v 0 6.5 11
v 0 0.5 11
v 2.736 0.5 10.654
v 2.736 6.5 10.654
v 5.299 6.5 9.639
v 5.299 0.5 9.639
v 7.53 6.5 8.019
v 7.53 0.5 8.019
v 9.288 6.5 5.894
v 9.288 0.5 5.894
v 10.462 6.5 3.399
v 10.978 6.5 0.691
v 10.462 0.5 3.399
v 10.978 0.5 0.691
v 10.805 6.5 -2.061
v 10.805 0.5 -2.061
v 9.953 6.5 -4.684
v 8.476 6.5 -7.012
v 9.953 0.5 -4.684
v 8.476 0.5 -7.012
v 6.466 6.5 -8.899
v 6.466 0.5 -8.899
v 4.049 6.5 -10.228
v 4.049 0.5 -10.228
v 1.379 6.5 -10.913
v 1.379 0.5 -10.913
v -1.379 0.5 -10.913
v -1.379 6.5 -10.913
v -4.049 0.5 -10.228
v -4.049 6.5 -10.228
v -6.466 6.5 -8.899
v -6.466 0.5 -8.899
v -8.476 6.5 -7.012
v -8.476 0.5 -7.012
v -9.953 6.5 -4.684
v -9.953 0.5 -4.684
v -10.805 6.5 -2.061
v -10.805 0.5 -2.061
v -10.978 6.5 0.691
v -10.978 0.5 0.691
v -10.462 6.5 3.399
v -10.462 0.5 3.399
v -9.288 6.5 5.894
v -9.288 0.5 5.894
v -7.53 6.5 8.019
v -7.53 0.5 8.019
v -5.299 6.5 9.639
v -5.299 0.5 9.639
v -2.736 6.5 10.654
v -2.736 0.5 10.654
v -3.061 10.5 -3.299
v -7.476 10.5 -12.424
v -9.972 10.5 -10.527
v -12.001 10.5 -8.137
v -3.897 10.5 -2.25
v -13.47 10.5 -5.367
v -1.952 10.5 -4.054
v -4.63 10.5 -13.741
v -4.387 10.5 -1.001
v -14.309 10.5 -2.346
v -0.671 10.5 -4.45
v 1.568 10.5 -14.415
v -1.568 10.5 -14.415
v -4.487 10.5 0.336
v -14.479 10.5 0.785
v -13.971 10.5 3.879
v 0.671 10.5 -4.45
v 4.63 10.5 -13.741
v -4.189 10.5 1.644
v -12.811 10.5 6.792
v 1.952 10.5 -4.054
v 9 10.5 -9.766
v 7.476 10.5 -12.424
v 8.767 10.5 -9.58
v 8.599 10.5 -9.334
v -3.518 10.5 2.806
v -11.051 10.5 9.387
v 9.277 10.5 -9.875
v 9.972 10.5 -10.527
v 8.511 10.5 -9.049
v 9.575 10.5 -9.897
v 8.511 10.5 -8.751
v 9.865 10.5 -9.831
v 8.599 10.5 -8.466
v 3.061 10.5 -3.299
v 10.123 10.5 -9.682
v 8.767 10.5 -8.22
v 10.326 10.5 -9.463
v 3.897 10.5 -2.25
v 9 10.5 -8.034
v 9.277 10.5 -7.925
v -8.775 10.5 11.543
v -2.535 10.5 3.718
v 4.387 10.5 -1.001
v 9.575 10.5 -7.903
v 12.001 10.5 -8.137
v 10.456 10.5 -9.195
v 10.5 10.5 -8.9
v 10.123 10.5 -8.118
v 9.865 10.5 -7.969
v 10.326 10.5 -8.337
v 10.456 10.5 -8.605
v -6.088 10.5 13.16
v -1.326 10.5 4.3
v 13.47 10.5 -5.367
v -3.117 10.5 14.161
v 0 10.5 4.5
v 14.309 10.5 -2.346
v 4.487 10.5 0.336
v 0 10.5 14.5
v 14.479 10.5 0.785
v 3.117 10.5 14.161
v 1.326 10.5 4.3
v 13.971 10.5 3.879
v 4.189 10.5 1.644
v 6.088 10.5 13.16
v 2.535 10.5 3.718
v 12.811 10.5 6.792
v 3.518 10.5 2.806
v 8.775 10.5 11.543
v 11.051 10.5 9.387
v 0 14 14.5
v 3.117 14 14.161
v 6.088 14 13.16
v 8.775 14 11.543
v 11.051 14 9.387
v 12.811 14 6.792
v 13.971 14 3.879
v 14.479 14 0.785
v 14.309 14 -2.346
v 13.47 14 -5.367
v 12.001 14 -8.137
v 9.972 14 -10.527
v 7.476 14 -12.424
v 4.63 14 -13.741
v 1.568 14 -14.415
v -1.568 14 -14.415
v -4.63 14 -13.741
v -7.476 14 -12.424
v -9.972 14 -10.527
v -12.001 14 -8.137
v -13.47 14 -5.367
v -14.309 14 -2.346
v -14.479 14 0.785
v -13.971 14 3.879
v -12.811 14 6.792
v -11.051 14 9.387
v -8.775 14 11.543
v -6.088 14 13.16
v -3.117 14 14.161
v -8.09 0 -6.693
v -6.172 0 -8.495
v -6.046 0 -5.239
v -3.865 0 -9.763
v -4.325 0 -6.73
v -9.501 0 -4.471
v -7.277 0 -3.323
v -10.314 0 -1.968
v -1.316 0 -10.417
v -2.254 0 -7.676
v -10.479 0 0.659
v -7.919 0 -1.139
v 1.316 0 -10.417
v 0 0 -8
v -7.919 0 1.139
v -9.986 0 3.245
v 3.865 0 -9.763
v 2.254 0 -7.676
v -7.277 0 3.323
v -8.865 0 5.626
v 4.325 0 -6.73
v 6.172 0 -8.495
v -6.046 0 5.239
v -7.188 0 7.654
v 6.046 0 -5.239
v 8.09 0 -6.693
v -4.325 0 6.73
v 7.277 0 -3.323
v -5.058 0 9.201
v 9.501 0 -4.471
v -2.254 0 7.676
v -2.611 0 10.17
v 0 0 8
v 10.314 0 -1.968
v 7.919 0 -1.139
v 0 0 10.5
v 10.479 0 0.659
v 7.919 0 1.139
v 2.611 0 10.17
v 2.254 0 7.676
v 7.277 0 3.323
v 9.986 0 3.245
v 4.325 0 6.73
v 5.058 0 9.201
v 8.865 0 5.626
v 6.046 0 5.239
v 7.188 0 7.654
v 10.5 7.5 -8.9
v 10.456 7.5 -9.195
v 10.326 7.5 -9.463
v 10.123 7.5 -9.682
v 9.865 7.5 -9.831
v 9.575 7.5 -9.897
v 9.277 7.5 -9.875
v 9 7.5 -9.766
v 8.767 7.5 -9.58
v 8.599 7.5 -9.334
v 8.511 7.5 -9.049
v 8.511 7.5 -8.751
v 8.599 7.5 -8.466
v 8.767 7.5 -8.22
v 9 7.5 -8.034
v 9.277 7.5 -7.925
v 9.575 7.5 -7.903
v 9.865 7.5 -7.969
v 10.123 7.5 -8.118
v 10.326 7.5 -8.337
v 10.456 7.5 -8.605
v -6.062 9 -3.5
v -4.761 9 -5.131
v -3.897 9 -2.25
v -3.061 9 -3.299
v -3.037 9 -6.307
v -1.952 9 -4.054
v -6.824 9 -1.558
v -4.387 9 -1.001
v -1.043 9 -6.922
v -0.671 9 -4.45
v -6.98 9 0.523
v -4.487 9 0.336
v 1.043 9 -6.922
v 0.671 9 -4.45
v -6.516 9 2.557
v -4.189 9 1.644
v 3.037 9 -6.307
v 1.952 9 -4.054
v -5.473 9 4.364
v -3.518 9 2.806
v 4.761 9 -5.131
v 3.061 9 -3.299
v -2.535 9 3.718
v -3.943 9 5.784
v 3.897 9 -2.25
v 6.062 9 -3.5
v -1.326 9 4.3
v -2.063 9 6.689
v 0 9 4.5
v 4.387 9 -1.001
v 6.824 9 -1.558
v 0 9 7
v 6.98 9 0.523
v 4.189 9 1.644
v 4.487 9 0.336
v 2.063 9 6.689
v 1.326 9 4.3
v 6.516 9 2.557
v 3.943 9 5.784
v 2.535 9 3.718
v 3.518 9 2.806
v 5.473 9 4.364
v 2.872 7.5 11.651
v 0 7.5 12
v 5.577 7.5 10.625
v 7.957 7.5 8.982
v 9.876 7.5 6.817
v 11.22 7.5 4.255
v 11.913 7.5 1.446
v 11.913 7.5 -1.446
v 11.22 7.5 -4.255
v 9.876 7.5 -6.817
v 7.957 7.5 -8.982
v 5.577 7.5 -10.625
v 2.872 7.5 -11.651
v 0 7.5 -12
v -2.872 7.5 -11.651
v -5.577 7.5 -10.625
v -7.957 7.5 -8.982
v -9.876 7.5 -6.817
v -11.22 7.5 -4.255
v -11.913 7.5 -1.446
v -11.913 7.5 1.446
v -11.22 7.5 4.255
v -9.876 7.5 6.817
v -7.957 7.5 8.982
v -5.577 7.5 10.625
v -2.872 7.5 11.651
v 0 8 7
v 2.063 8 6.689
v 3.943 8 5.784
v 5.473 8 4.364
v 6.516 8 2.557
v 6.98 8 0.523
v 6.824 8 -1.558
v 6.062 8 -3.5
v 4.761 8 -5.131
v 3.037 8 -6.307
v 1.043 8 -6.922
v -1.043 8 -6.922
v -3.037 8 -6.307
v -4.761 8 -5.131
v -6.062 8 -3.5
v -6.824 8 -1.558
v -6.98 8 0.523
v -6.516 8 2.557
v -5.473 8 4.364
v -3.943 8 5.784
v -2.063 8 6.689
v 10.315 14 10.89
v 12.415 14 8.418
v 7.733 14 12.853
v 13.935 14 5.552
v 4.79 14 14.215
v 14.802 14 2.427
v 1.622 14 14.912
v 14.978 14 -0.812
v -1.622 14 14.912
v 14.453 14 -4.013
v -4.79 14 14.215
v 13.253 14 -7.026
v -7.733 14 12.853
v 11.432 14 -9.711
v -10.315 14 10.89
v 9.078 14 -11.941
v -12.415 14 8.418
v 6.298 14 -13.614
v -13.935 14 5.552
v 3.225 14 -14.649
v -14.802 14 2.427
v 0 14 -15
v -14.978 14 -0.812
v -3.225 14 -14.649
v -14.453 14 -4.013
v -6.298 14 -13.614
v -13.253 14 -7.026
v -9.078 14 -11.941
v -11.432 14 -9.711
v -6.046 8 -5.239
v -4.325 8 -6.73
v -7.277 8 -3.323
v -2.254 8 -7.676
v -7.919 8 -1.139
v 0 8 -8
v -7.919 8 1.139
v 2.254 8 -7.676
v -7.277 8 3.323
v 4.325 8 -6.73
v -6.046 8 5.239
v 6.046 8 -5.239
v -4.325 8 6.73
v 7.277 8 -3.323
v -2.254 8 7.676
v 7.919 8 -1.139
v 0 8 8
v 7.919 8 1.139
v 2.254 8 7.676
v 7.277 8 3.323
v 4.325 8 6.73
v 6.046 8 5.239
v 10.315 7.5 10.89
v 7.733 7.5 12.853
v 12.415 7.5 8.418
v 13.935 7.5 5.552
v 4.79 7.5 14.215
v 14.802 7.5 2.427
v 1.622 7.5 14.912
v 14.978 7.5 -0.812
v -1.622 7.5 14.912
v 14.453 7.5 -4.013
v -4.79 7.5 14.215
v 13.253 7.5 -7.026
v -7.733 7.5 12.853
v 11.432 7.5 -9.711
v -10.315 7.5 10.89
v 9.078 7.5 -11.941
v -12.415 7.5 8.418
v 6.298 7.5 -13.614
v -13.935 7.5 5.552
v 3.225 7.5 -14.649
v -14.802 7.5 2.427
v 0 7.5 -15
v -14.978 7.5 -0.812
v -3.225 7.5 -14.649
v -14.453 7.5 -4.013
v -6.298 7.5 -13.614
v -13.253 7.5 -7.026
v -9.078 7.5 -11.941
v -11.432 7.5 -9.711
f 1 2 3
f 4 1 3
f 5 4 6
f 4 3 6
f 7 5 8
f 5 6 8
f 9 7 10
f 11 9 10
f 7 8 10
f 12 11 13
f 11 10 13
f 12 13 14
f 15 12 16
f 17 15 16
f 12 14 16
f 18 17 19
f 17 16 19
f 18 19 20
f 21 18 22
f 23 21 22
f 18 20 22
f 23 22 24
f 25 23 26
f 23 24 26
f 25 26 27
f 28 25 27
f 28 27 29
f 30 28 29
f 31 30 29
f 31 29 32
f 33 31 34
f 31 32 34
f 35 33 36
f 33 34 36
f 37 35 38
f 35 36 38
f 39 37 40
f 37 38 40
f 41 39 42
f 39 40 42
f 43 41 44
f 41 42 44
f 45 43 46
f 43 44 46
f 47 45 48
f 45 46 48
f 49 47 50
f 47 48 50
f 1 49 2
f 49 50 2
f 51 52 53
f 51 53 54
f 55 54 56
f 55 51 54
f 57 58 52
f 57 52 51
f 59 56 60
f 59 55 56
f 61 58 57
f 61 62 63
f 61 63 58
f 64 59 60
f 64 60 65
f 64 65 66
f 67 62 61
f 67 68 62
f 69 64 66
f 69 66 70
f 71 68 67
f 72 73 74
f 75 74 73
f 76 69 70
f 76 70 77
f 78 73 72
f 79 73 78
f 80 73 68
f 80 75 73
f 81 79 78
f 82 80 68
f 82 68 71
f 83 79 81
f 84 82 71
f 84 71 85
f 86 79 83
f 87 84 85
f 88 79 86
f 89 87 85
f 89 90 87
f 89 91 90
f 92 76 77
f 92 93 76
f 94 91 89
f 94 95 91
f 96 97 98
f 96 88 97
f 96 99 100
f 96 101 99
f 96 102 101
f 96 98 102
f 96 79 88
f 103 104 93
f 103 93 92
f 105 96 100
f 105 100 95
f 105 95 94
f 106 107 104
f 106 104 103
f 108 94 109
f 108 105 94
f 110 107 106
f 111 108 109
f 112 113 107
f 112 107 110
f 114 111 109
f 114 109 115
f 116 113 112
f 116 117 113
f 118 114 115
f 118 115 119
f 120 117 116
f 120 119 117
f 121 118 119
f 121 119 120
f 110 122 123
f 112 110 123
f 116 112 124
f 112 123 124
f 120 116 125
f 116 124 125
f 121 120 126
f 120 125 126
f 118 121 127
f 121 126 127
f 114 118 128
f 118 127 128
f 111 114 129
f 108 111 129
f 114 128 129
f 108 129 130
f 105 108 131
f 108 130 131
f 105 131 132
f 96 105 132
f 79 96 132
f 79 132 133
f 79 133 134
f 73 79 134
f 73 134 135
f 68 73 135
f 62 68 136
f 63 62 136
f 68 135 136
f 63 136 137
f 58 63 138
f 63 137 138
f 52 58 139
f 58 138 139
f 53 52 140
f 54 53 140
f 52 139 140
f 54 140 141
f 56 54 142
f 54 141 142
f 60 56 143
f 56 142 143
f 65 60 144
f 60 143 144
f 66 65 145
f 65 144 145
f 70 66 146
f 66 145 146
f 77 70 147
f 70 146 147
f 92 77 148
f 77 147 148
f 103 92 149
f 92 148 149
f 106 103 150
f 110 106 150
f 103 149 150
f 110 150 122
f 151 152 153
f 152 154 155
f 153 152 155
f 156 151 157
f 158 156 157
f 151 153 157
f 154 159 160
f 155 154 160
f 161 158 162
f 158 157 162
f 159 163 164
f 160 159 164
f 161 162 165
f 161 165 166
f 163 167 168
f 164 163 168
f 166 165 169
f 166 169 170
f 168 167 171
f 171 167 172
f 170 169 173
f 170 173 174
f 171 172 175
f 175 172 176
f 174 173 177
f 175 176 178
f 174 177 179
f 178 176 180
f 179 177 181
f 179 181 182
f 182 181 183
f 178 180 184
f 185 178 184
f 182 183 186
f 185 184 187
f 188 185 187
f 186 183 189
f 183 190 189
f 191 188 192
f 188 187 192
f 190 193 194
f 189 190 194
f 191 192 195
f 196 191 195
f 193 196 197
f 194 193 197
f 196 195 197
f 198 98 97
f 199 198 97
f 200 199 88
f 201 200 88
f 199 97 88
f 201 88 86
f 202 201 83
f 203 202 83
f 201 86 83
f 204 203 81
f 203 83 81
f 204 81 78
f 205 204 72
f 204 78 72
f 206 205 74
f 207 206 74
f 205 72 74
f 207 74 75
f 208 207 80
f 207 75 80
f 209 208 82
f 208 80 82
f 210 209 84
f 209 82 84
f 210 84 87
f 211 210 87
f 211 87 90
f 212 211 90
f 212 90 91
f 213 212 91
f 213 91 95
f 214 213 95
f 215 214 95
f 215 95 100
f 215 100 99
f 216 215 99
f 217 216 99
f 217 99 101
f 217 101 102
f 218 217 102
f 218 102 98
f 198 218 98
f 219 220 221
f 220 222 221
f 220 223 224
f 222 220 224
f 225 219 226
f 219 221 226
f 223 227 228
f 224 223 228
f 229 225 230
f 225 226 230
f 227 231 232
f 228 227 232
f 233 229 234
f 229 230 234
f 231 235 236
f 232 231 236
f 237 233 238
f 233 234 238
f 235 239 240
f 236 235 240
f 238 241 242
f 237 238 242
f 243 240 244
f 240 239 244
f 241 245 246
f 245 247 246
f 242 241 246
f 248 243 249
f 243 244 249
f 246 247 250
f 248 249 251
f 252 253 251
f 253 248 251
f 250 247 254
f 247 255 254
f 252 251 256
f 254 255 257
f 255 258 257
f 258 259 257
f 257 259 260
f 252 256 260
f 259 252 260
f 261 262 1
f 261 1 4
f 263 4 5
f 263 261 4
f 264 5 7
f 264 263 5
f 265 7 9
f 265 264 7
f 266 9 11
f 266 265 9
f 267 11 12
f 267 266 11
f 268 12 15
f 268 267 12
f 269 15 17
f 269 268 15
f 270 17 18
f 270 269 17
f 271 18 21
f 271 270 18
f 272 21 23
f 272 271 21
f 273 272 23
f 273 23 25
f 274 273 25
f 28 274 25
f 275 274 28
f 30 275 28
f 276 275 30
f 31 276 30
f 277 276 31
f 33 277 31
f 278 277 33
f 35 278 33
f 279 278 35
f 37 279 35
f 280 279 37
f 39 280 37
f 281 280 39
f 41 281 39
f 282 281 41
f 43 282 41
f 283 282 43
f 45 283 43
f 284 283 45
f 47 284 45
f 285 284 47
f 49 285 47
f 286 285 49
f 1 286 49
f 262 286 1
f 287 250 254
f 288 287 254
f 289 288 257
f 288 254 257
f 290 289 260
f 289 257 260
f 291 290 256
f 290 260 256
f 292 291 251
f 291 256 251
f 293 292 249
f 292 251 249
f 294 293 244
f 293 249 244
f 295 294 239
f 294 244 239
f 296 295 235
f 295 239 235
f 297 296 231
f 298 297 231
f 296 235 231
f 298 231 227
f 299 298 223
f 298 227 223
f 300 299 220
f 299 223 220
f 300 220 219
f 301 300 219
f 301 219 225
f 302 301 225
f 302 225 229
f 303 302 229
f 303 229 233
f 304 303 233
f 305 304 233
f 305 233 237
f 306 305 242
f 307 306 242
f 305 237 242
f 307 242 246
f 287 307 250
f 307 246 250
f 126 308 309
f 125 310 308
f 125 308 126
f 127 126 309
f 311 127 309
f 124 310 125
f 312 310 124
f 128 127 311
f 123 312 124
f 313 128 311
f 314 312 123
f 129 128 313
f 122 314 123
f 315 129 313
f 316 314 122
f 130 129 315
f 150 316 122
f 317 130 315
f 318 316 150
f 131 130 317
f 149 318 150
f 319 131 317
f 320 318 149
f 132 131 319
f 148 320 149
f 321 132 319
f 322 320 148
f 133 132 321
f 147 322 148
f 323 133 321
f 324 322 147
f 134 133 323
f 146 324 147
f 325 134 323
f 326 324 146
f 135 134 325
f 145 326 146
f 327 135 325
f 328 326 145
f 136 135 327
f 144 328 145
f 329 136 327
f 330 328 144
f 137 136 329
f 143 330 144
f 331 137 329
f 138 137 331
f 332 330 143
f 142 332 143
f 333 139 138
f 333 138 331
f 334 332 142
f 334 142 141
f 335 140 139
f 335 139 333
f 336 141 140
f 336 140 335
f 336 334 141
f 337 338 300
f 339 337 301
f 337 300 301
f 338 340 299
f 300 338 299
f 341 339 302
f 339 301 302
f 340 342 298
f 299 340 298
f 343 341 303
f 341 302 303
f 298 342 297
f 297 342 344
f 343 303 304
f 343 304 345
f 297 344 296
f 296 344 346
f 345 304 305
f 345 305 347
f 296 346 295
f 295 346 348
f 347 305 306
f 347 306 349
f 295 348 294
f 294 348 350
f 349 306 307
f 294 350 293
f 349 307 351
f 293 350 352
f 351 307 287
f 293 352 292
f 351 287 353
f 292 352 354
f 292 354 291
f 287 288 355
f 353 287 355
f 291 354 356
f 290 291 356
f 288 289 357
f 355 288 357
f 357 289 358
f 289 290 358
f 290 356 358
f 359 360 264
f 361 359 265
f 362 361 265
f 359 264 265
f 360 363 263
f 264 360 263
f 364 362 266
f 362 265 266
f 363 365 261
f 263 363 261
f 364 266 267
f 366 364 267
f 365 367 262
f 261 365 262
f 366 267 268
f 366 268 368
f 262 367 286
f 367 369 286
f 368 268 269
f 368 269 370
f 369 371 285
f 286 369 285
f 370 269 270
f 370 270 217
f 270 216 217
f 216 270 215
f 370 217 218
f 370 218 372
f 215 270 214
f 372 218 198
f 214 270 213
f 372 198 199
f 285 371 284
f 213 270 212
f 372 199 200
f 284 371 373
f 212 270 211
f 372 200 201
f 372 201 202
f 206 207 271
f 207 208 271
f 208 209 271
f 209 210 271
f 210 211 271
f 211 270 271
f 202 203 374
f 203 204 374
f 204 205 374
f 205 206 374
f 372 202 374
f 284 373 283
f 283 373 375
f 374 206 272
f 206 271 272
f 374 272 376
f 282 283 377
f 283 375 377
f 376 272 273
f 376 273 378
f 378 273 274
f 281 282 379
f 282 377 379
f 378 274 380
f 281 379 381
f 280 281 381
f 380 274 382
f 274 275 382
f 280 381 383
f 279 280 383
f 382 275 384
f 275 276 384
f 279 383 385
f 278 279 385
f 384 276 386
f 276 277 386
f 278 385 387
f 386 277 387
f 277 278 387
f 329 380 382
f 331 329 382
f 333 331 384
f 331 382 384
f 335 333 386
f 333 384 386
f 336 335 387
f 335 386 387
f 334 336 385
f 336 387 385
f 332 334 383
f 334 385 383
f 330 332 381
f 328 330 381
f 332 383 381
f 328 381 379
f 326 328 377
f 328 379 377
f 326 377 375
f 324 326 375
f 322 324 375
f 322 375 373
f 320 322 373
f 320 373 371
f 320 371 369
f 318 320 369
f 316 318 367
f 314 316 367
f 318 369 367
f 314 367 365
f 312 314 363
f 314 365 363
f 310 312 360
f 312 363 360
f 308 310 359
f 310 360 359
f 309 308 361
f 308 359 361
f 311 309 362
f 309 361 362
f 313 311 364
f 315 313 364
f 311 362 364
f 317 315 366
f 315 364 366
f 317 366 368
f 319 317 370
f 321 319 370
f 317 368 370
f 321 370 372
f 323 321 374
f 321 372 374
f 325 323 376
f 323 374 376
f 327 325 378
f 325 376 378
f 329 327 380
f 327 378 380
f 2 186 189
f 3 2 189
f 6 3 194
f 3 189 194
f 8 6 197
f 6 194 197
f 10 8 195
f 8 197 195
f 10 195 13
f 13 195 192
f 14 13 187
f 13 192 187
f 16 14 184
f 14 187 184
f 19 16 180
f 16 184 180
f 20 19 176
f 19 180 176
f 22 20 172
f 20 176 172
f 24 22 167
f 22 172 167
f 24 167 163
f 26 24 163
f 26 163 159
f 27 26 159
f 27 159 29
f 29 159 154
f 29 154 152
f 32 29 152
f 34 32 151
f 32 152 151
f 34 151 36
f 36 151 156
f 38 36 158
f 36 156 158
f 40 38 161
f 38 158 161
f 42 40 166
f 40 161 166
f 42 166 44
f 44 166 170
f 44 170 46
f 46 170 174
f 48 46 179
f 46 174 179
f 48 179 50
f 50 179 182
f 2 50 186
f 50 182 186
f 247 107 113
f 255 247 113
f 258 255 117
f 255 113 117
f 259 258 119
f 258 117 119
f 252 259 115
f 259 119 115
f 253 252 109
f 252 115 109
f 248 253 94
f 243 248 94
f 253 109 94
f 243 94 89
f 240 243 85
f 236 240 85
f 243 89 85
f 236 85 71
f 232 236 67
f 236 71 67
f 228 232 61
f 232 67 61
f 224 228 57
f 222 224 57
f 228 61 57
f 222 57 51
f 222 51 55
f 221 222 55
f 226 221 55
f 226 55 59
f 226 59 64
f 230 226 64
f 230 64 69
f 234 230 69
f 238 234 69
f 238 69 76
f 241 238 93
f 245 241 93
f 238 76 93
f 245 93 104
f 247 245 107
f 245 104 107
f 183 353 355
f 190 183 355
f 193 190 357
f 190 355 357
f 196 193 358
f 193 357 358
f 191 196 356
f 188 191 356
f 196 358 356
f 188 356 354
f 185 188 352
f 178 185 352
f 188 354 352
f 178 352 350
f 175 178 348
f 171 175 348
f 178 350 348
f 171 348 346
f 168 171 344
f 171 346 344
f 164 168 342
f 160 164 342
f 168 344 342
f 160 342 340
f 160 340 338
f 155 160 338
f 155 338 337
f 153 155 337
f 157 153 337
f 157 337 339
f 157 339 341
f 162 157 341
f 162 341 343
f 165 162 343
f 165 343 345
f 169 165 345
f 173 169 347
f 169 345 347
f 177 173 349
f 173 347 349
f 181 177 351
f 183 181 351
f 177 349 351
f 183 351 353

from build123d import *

# Parameters (mm, degrees)
ESQUISSE1_R              = 11
BOSS_EXTRU_1_DEPTH       = 7.5
ESQUISSE3_R              = 15
BOSS_EXTRU_2_DEPTH       = 6.5
CHANFREIN1_SIZE          = 0.5
CHANFREIN2_SIZE          = 1
ESQUISSE4_R              = 14.5
ENL_V_MAT_EXTRU_1_DEPTH  = 3.5
ESQUISSE5_R              = 4.5
ENL_V_MAT_EXTRU_2_DEPTH  = 1.5
ESQUISSE6_R              = 7
ENL_V_MAT_EXTRU_3_DEPTH  = 1
ESQUISSE20_R             = 8
ENL_V_MAT_EXTRU_4_DEPTH  = 8
F_2_0_2_DIAMETER_HOLE1_D = 2


with BuildPart() as part:
    # Esquisse1 → Boss.-Extru.1 (new body)
    with BuildSketch(Plane(origin=(0, 0, 0), x_dir=(1, 0, 0), z_dir=(0, 1, 0))):
        with Locations(Location((0, 0, 0), (0, 0, 270))):
            Circle(ESQUISSE1_R)
    extrude(amount=BOSS_EXTRU_1_DEPTH)

    # Esquisse3 → Boss.-Extru.2 (add)
    with BuildSketch(Plane(origin=(0, 7.5, 0), x_dir=(1, 0, 0), z_dir=(0, 1, 0))):
        with Locations(Location((0, 0, 0), (0, 0, 90))):
            Circle(ESQUISSE3_R)
    extrude(amount=BOSS_EXTRU_2_DEPTH)

    # Chanfrein1
    chanfrein1_edges = [part.edges().sort_by_distance(p)[0] for p in [
        (0, 0, -11),
    ]]
    chamfer(chanfrein1_edges, length=CHANFREIN1_SIZE)

    # Chanfrein2
    chanfrein2_edges = [part.edges().sort_by_distance(p)[0] for p in [
        (0, 7.5, -11),
    ]]
    chamfer(chanfrein2_edges, length=CHANFREIN2_SIZE)

    # Esquisse4 → Enlèv. mat.-Extru.1 (cut)
    with BuildSketch(Plane(origin=(0, 14, 0), x_dir=(1, 0, 0), z_dir=(0, 1, 0))):
        with Locations(Location((0, 0, 0), (0, 0, 270))):
            Circle(ESQUISSE4_R)
    extrude(amount=-ENL_V_MAT_EXTRU_1_DEPTH, mode=Mode.SUBTRACT)

    # Esquisse5 → Enlèv. mat.-Extru.2 (cut)
    with BuildSketch(Plane(origin=(0, 10.5, 0), x_dir=(1, 0, 0), z_dir=(0, 1, 0))):
        with Locations(Location((0, 0, 0), (0, 0, 270))):
            Circle(ESQUISSE5_R)
    extrude(amount=-ENL_V_MAT_EXTRU_2_DEPTH, mode=Mode.SUBTRACT)

    # Esquisse6 → Enlèv. mat.-Extru.3 (cut)
    with BuildSketch(Plane(origin=(0, 9, 0), x_dir=(1, 0, 0), z_dir=(0, 1, 0))):
        with Locations(Location((0, 0, 0), (0, 0, 270))):
            Circle(ESQUISSE6_R)
    extrude(amount=-ENL_V_MAT_EXTRU_3_DEPTH, mode=Mode.SUBTRACT)

    # Esquisse20 → Enlèv. mat.-Extru.4 (cut)
    with BuildSketch(Plane(origin=(0, 8, 0), x_dir=(1, 0, 0), z_dir=(0, 1, 0))):
        with Locations(Location((0, 0, 0), (0, 0, 270))):
            Circle(ESQUISSE20_R)
    extrude(amount=-ENL_V_MAT_EXTRU_4_DEPTH, mode=Mode.SUBTRACT)

    # Ø2.0 (2) Diameter Hole1 (through all)
    with Locations(Plane(origin=(0, 7.5, 0), x_dir=(-1, 0, 0), z_dir=(0, -1, 0))):
        with Locations((-9.5, 8.9)):
            Hole(F_2_0_2_DIAMETER_HOLE1_D / 2)


solid = part.part
